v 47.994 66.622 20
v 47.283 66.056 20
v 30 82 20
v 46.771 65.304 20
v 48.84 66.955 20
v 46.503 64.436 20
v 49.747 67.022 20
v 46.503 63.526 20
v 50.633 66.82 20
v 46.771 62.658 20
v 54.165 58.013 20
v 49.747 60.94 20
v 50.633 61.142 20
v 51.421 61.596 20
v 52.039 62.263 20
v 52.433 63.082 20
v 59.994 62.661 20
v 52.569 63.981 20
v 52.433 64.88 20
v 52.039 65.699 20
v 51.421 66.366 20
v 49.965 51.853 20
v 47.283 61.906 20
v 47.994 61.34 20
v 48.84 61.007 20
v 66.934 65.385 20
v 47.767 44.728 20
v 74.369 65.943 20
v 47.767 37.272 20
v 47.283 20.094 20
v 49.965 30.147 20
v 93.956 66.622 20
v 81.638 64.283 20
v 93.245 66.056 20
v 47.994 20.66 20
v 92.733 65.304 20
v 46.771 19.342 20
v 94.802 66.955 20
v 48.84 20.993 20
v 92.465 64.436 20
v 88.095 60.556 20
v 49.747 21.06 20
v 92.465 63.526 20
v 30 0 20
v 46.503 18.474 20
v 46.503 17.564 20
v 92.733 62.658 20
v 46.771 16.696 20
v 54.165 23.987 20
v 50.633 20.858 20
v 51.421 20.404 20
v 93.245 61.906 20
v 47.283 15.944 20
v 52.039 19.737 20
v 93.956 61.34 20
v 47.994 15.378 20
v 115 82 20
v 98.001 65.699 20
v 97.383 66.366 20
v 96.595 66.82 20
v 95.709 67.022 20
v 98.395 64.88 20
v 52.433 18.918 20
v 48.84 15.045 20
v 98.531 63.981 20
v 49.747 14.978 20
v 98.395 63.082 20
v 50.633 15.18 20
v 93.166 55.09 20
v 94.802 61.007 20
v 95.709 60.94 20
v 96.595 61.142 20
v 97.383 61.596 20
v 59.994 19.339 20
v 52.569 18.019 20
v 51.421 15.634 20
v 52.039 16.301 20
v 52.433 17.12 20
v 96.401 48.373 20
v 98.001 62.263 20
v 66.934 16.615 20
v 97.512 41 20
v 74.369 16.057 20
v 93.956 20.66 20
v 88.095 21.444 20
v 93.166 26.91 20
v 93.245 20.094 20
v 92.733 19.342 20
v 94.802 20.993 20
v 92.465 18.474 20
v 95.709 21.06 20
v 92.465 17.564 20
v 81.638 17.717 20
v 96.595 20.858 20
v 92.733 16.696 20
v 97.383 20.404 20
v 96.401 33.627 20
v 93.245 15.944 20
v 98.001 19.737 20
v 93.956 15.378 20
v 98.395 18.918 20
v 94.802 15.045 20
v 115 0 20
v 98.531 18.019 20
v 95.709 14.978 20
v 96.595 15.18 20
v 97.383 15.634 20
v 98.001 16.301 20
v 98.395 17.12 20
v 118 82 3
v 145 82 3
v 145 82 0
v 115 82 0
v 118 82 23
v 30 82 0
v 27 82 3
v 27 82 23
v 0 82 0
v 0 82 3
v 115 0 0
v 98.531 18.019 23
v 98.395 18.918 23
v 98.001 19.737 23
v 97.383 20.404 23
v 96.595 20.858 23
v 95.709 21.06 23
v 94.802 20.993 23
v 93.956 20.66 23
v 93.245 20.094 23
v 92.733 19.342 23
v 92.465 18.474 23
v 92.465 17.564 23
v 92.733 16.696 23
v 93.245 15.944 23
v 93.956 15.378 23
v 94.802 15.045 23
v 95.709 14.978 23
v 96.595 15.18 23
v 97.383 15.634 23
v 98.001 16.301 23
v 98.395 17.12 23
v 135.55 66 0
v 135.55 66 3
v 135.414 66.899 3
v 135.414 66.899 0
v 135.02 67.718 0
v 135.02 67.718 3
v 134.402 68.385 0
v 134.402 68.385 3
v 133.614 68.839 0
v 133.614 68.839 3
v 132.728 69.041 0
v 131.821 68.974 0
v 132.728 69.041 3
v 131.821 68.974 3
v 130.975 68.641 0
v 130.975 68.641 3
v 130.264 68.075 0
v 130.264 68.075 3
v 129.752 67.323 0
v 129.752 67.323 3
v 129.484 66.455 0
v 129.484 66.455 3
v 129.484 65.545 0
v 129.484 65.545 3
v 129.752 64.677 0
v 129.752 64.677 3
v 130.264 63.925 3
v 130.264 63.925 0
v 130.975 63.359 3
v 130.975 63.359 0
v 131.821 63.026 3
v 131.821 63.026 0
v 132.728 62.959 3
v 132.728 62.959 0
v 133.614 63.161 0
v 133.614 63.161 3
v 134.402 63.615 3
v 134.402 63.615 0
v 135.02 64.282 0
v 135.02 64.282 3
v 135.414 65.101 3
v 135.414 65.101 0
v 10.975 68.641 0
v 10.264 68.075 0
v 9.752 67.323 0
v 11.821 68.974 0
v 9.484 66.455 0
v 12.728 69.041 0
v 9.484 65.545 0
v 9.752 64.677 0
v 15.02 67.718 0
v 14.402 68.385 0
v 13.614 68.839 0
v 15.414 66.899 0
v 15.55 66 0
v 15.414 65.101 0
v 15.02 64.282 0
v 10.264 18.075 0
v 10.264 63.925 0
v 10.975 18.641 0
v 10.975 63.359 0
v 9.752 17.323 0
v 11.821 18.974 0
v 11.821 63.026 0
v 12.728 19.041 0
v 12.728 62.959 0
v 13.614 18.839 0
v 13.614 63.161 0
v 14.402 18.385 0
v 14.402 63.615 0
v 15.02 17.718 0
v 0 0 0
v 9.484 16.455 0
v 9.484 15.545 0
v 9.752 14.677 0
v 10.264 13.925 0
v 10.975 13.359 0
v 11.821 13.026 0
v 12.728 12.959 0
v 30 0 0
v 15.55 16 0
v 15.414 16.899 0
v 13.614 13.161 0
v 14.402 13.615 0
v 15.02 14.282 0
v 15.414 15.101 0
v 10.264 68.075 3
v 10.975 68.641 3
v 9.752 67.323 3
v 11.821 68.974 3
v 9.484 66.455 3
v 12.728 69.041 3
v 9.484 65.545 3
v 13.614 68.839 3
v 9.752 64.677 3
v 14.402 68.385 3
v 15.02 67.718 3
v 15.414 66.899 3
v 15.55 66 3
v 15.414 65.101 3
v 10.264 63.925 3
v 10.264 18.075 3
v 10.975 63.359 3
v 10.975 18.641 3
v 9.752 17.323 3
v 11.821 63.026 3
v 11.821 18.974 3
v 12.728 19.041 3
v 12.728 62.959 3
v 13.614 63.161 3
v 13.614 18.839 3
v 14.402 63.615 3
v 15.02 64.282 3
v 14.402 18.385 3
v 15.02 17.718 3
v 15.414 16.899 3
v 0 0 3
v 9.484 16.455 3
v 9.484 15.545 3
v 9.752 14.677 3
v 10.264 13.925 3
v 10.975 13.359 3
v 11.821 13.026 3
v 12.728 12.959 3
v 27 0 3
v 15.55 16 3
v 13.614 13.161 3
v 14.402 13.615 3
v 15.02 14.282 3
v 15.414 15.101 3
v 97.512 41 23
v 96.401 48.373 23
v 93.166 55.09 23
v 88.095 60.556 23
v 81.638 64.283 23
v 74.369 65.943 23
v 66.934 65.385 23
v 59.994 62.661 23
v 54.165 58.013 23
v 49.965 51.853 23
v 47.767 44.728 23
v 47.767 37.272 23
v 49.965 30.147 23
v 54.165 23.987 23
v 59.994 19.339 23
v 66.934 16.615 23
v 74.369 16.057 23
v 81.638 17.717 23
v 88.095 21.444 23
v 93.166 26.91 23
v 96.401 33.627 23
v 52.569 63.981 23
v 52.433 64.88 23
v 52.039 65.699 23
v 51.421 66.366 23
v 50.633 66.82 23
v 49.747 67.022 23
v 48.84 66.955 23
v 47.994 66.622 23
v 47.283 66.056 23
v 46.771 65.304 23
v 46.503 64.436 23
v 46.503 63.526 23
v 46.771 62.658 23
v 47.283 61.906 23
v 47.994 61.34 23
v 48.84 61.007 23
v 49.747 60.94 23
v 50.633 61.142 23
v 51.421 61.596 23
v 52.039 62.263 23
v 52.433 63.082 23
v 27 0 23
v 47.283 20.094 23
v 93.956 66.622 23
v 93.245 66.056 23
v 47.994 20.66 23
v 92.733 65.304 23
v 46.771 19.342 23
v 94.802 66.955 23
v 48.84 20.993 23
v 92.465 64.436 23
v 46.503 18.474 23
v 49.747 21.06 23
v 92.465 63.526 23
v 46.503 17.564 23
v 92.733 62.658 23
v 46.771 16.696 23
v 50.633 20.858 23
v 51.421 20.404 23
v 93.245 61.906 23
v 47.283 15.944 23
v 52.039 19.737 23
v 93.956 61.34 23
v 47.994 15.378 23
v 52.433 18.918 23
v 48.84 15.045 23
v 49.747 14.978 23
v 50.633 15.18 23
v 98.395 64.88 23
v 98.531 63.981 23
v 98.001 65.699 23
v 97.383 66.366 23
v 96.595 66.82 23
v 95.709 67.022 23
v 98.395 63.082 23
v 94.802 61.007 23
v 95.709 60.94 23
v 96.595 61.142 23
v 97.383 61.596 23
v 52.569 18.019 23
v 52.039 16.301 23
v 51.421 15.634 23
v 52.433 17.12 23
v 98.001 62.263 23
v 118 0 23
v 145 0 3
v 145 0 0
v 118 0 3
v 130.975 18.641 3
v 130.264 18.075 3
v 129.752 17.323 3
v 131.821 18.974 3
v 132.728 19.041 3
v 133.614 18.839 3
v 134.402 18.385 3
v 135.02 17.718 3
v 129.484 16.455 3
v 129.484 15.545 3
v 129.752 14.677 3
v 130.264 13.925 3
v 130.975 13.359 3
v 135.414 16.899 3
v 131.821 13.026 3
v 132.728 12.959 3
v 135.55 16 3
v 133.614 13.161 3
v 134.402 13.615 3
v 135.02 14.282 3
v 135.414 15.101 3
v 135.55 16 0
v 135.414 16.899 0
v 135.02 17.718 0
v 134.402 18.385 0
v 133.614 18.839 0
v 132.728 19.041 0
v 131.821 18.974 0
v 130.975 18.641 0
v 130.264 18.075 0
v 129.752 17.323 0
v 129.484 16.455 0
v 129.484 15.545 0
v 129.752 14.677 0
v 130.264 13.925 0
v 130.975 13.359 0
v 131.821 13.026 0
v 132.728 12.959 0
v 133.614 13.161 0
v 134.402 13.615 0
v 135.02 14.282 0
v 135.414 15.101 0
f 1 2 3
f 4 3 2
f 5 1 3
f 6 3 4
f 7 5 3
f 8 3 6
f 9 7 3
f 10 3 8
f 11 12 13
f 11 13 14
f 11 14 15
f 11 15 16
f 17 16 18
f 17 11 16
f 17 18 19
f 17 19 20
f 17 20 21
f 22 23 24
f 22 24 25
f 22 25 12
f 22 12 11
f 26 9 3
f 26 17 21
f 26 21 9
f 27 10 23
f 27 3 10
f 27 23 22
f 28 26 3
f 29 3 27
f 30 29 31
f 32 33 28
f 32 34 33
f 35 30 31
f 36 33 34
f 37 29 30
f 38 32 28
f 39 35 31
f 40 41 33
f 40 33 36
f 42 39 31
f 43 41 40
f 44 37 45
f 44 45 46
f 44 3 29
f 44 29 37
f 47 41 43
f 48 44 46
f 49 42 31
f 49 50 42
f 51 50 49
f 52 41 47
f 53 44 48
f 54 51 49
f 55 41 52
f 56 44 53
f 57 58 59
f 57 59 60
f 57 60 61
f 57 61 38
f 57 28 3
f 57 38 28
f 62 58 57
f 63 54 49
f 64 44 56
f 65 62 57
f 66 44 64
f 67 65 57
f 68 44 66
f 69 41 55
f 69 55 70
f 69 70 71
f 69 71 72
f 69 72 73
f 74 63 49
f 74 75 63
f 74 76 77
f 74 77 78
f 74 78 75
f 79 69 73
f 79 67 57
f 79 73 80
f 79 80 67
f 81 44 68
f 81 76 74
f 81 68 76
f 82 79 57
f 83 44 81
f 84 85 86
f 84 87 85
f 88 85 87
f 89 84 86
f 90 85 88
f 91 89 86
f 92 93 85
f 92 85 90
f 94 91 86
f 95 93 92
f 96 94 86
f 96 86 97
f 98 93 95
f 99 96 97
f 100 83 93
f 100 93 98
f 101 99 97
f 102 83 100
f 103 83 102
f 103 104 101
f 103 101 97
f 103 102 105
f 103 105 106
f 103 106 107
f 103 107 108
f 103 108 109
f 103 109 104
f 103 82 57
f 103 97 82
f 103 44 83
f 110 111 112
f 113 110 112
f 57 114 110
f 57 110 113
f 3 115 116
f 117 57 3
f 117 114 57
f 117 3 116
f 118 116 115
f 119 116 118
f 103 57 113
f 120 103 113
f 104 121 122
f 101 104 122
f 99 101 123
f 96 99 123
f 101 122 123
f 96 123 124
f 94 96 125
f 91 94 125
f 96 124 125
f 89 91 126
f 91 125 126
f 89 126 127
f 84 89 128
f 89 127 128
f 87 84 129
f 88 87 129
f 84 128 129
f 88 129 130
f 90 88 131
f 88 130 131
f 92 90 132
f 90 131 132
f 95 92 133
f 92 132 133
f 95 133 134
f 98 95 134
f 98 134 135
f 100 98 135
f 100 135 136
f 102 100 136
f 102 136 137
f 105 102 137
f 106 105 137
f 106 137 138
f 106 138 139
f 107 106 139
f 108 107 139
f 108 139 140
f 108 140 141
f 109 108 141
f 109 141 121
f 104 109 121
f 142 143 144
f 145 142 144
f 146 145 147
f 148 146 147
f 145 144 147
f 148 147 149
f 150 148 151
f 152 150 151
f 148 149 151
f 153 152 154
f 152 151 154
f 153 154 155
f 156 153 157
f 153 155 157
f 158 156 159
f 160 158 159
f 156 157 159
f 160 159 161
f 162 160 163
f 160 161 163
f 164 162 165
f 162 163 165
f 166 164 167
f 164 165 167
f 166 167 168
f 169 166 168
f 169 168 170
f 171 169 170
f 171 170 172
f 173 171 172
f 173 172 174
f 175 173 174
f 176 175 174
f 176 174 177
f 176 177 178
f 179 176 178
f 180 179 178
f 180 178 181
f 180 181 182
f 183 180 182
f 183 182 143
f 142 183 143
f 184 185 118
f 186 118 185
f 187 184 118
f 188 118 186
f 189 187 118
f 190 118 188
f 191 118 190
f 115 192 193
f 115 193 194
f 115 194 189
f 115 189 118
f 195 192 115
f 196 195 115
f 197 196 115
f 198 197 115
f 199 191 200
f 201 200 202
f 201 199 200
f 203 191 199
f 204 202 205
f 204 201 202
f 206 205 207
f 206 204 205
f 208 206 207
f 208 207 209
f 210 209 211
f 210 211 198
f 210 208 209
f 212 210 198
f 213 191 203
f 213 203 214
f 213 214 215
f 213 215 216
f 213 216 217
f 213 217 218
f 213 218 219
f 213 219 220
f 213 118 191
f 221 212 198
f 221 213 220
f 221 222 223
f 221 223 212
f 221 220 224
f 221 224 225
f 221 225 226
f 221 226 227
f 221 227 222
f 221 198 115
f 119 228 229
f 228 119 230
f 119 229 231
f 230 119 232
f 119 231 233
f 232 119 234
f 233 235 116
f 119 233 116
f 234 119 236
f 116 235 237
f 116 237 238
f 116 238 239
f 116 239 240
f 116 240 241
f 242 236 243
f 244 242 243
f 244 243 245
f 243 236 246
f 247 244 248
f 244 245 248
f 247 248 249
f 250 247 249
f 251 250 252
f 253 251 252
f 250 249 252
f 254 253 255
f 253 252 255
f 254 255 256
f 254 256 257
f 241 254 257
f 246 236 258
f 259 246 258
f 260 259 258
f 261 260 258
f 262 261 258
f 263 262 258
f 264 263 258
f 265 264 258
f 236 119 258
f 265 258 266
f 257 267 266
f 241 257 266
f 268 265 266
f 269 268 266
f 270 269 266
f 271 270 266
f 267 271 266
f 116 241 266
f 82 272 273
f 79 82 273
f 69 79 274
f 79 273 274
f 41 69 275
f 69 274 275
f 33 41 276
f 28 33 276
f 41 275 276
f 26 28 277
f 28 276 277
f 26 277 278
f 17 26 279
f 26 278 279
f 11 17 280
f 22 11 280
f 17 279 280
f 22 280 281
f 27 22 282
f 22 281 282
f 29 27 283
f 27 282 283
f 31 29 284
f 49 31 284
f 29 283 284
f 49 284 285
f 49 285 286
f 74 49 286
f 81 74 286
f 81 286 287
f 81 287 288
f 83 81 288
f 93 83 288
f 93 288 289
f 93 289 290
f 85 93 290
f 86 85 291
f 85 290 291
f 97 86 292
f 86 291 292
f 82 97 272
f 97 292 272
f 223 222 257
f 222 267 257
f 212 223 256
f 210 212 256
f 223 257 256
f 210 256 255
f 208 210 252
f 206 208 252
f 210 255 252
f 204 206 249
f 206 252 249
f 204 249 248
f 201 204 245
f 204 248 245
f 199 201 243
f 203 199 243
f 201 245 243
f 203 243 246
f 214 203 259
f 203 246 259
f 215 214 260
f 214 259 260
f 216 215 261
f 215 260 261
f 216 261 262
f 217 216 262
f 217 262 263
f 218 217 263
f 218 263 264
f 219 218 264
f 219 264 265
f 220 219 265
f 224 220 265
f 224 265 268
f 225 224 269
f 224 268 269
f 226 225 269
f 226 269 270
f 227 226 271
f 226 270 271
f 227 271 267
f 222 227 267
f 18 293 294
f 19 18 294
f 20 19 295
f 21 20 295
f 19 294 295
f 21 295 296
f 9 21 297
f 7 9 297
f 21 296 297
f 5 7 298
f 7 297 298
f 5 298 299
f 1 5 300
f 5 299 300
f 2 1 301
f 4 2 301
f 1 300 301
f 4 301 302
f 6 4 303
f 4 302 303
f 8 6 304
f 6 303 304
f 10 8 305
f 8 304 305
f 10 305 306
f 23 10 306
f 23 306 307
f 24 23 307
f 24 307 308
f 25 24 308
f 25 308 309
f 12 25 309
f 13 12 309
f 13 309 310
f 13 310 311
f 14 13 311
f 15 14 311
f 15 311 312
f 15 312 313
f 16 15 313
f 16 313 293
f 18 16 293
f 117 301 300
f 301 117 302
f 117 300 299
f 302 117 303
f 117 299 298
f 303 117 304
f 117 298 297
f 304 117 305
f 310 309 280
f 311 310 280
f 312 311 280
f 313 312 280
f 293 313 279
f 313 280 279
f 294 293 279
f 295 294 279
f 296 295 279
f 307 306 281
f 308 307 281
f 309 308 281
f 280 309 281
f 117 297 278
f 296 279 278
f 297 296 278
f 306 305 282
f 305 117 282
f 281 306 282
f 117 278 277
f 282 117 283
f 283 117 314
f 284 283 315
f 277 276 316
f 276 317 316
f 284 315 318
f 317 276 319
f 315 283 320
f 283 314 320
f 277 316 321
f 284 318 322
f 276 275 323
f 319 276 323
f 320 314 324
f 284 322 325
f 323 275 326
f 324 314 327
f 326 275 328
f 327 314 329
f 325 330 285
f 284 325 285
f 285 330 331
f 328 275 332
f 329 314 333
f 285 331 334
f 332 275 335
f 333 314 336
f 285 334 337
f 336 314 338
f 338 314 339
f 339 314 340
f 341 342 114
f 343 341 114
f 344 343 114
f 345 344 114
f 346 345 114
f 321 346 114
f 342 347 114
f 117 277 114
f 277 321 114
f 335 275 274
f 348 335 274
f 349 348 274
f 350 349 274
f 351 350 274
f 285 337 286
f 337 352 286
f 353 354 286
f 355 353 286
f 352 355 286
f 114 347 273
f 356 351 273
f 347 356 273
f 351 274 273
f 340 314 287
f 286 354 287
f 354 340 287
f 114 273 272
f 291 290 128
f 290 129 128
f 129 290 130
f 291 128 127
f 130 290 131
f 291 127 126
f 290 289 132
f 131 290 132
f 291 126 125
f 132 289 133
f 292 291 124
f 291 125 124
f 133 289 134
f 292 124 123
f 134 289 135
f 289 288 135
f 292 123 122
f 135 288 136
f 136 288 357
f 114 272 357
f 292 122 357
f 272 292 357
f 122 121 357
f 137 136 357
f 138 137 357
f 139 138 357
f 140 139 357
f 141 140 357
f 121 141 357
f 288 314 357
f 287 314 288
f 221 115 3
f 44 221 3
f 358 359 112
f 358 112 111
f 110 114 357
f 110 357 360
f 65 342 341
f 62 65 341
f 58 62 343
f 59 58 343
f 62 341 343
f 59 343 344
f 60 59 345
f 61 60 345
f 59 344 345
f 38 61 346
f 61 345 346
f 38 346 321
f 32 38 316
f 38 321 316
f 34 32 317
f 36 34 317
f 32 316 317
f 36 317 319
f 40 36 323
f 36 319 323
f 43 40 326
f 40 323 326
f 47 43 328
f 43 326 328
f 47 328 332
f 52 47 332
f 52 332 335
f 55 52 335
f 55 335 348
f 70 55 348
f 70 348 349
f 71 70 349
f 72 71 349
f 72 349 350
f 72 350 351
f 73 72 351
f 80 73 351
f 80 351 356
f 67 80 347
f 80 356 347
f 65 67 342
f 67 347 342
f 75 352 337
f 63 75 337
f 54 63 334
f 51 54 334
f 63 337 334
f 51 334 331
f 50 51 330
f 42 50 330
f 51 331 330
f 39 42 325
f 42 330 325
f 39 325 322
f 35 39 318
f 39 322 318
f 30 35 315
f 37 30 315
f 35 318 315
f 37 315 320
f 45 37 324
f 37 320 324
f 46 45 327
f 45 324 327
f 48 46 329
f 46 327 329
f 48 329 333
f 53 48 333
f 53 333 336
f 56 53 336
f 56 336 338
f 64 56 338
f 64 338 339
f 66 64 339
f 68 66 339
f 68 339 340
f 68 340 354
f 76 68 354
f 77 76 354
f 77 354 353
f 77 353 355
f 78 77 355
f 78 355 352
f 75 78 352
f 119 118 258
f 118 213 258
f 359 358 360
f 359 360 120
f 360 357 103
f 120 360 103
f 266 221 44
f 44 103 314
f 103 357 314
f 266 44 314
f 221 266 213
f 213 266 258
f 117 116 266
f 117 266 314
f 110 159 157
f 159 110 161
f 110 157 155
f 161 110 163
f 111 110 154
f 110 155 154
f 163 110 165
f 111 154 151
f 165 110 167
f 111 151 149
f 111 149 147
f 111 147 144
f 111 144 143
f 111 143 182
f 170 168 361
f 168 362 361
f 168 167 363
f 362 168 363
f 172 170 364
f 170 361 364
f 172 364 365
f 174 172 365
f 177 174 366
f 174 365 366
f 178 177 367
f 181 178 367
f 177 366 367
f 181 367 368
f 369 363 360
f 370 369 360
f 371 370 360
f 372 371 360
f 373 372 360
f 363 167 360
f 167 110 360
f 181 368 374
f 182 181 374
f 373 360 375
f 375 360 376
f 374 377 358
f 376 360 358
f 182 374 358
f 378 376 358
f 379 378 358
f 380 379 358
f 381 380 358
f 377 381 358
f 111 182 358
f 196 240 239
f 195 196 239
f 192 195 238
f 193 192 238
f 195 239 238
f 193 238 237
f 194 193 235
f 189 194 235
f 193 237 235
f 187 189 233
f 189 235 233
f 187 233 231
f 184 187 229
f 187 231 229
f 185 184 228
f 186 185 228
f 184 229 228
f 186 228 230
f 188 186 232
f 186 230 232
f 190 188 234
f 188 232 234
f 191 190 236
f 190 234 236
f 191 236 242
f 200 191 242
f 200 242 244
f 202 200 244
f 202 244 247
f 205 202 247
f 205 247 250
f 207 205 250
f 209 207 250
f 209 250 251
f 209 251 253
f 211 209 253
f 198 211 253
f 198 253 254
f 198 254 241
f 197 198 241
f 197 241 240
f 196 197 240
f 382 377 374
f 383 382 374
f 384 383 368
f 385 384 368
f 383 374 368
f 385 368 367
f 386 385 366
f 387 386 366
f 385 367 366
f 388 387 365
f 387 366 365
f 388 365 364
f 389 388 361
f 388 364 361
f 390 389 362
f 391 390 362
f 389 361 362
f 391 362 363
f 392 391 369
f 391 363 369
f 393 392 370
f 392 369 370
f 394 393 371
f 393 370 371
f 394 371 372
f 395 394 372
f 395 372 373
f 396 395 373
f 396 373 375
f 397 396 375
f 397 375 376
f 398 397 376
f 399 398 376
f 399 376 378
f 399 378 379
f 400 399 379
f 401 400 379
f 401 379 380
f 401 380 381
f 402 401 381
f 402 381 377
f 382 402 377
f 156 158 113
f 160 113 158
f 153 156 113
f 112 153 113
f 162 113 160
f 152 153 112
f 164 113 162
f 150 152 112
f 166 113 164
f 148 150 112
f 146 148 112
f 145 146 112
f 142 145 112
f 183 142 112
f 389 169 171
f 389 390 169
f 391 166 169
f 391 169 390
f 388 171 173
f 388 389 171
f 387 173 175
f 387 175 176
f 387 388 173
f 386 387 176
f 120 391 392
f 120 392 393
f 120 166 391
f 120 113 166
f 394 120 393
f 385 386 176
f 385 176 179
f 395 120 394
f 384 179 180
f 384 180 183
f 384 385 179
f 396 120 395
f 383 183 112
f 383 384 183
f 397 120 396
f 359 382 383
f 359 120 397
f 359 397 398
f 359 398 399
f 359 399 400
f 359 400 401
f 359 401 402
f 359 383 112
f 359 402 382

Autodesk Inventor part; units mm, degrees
ref_plane "YZ Plane" through (0, 0, 0) normal (1, 0, 0) x (0, 1, 0)
ref_plane "XZ Plane" through (0, 0, 0) normal (0, 1, 0) x (-1, 0, 0)
ref_plane "XY Plane" through (0, 0, 0) normal (0, 0, 1) x (1, 0, 0)
sketch "Sketch1" plane through (0, 0, 0) normal (0, 1, 0) x (-1, 0, 0)
  line L0 (0, 0) -> (-30, 0)
  line L1 (-30, 0) -> (-30, 20)
  line L2 (-30, 20) -> (-115, 20)
  line L3 (-115, 20) -> (-115, 0)
  line L4 (-115, 0) -> (-145, 0)
  line L5 (0, 3) -> (-27, 3)
  line L6 (-27, 3) -> (-27, 23)
  line L7 (-27, 23) -> (-118, 23)
  line L8 (-118, 23) -> (-118, 3)
  line L9 (-118, 3) -> (-145, 3)
  line L10 (0, 0) -> (0, 3)
  line L11 (-145, 0) -> (-145, 3)
  dimension "d0" = 30
  dimension "d1" = 20
  dimension "d2" = 3
  dimension "d28" = 85
extrude "Extrusion1" add sketch "Sketch1" along normal blind 82
sketch "Sketch2" plane through (27, 0, 23) normal (0, 0, 1) x (1, 0, 0)
  line L0 (0, 82) -> (91, 82) projected
  line L1 (45.5, 82) -> (45.5, 0) construction
  line L2 (0, 0) -> (91, 0) projected
  circle A0 centre (45.5, 41) radius 32.5 construction
  line L3 (45.5, 41) -> (68.481, 63.981) construction
  circle A1 centre (68.481, 63.981) radius 3.05
  circle A2 centre (22.519, 63.981) radius 3.05
  circle A3 centre (22.519, 18.019) radius 3.05
  circle A4 centre (68.481, 18.019) radius 3.05
  circle A5 centre (45.5, 41) radius 25.0125
  point P0 (-27, 0)
  dimension "d6" = 65
  dimension "d7" = 6.1
  dimension "d8" = 45
  dimension "d11" = 360
  dimension "d15" = 50.025
extrude "Extrusion2" cut sketch "Sketch2" against normal blind 82
sketch "Sketch3" plane through (0, 0, 3) normal (0, 0, 1) x (1, 0, 0)
  circle A0 centre (72.5, 41) radius 25.0125 construction
  line L0 (12.5, 66) -> (132.5, 66) construction
  line L1 (132.5, 66) -> (132.5, 16) construction
  line L2 (132.5, 16) -> (12.5, 16) construction
  line L3 (12.5, 16) -> (12.5, 66) construction
  line L4 (12.5, 66) -> (132.5, 16) construction
  line L5 (132.5, 66) -> (12.5, 16) construction
  circle A1 centre (12.5, 66) radius 3.05
  circle A2 centre (12.5, 16) radius 3.05
  circle A3 centre (132.5, 66) radius 3.05
  circle A4 centre (132.5, 16) radius 3.05
  dimension "d29" = 6.1
  dimension "d30" = 120
  dimension "d31" = 50
extrude "Extrusion3" cut sketch "Sketch3" against normal blind 10
properties part number "MotorBracket"
